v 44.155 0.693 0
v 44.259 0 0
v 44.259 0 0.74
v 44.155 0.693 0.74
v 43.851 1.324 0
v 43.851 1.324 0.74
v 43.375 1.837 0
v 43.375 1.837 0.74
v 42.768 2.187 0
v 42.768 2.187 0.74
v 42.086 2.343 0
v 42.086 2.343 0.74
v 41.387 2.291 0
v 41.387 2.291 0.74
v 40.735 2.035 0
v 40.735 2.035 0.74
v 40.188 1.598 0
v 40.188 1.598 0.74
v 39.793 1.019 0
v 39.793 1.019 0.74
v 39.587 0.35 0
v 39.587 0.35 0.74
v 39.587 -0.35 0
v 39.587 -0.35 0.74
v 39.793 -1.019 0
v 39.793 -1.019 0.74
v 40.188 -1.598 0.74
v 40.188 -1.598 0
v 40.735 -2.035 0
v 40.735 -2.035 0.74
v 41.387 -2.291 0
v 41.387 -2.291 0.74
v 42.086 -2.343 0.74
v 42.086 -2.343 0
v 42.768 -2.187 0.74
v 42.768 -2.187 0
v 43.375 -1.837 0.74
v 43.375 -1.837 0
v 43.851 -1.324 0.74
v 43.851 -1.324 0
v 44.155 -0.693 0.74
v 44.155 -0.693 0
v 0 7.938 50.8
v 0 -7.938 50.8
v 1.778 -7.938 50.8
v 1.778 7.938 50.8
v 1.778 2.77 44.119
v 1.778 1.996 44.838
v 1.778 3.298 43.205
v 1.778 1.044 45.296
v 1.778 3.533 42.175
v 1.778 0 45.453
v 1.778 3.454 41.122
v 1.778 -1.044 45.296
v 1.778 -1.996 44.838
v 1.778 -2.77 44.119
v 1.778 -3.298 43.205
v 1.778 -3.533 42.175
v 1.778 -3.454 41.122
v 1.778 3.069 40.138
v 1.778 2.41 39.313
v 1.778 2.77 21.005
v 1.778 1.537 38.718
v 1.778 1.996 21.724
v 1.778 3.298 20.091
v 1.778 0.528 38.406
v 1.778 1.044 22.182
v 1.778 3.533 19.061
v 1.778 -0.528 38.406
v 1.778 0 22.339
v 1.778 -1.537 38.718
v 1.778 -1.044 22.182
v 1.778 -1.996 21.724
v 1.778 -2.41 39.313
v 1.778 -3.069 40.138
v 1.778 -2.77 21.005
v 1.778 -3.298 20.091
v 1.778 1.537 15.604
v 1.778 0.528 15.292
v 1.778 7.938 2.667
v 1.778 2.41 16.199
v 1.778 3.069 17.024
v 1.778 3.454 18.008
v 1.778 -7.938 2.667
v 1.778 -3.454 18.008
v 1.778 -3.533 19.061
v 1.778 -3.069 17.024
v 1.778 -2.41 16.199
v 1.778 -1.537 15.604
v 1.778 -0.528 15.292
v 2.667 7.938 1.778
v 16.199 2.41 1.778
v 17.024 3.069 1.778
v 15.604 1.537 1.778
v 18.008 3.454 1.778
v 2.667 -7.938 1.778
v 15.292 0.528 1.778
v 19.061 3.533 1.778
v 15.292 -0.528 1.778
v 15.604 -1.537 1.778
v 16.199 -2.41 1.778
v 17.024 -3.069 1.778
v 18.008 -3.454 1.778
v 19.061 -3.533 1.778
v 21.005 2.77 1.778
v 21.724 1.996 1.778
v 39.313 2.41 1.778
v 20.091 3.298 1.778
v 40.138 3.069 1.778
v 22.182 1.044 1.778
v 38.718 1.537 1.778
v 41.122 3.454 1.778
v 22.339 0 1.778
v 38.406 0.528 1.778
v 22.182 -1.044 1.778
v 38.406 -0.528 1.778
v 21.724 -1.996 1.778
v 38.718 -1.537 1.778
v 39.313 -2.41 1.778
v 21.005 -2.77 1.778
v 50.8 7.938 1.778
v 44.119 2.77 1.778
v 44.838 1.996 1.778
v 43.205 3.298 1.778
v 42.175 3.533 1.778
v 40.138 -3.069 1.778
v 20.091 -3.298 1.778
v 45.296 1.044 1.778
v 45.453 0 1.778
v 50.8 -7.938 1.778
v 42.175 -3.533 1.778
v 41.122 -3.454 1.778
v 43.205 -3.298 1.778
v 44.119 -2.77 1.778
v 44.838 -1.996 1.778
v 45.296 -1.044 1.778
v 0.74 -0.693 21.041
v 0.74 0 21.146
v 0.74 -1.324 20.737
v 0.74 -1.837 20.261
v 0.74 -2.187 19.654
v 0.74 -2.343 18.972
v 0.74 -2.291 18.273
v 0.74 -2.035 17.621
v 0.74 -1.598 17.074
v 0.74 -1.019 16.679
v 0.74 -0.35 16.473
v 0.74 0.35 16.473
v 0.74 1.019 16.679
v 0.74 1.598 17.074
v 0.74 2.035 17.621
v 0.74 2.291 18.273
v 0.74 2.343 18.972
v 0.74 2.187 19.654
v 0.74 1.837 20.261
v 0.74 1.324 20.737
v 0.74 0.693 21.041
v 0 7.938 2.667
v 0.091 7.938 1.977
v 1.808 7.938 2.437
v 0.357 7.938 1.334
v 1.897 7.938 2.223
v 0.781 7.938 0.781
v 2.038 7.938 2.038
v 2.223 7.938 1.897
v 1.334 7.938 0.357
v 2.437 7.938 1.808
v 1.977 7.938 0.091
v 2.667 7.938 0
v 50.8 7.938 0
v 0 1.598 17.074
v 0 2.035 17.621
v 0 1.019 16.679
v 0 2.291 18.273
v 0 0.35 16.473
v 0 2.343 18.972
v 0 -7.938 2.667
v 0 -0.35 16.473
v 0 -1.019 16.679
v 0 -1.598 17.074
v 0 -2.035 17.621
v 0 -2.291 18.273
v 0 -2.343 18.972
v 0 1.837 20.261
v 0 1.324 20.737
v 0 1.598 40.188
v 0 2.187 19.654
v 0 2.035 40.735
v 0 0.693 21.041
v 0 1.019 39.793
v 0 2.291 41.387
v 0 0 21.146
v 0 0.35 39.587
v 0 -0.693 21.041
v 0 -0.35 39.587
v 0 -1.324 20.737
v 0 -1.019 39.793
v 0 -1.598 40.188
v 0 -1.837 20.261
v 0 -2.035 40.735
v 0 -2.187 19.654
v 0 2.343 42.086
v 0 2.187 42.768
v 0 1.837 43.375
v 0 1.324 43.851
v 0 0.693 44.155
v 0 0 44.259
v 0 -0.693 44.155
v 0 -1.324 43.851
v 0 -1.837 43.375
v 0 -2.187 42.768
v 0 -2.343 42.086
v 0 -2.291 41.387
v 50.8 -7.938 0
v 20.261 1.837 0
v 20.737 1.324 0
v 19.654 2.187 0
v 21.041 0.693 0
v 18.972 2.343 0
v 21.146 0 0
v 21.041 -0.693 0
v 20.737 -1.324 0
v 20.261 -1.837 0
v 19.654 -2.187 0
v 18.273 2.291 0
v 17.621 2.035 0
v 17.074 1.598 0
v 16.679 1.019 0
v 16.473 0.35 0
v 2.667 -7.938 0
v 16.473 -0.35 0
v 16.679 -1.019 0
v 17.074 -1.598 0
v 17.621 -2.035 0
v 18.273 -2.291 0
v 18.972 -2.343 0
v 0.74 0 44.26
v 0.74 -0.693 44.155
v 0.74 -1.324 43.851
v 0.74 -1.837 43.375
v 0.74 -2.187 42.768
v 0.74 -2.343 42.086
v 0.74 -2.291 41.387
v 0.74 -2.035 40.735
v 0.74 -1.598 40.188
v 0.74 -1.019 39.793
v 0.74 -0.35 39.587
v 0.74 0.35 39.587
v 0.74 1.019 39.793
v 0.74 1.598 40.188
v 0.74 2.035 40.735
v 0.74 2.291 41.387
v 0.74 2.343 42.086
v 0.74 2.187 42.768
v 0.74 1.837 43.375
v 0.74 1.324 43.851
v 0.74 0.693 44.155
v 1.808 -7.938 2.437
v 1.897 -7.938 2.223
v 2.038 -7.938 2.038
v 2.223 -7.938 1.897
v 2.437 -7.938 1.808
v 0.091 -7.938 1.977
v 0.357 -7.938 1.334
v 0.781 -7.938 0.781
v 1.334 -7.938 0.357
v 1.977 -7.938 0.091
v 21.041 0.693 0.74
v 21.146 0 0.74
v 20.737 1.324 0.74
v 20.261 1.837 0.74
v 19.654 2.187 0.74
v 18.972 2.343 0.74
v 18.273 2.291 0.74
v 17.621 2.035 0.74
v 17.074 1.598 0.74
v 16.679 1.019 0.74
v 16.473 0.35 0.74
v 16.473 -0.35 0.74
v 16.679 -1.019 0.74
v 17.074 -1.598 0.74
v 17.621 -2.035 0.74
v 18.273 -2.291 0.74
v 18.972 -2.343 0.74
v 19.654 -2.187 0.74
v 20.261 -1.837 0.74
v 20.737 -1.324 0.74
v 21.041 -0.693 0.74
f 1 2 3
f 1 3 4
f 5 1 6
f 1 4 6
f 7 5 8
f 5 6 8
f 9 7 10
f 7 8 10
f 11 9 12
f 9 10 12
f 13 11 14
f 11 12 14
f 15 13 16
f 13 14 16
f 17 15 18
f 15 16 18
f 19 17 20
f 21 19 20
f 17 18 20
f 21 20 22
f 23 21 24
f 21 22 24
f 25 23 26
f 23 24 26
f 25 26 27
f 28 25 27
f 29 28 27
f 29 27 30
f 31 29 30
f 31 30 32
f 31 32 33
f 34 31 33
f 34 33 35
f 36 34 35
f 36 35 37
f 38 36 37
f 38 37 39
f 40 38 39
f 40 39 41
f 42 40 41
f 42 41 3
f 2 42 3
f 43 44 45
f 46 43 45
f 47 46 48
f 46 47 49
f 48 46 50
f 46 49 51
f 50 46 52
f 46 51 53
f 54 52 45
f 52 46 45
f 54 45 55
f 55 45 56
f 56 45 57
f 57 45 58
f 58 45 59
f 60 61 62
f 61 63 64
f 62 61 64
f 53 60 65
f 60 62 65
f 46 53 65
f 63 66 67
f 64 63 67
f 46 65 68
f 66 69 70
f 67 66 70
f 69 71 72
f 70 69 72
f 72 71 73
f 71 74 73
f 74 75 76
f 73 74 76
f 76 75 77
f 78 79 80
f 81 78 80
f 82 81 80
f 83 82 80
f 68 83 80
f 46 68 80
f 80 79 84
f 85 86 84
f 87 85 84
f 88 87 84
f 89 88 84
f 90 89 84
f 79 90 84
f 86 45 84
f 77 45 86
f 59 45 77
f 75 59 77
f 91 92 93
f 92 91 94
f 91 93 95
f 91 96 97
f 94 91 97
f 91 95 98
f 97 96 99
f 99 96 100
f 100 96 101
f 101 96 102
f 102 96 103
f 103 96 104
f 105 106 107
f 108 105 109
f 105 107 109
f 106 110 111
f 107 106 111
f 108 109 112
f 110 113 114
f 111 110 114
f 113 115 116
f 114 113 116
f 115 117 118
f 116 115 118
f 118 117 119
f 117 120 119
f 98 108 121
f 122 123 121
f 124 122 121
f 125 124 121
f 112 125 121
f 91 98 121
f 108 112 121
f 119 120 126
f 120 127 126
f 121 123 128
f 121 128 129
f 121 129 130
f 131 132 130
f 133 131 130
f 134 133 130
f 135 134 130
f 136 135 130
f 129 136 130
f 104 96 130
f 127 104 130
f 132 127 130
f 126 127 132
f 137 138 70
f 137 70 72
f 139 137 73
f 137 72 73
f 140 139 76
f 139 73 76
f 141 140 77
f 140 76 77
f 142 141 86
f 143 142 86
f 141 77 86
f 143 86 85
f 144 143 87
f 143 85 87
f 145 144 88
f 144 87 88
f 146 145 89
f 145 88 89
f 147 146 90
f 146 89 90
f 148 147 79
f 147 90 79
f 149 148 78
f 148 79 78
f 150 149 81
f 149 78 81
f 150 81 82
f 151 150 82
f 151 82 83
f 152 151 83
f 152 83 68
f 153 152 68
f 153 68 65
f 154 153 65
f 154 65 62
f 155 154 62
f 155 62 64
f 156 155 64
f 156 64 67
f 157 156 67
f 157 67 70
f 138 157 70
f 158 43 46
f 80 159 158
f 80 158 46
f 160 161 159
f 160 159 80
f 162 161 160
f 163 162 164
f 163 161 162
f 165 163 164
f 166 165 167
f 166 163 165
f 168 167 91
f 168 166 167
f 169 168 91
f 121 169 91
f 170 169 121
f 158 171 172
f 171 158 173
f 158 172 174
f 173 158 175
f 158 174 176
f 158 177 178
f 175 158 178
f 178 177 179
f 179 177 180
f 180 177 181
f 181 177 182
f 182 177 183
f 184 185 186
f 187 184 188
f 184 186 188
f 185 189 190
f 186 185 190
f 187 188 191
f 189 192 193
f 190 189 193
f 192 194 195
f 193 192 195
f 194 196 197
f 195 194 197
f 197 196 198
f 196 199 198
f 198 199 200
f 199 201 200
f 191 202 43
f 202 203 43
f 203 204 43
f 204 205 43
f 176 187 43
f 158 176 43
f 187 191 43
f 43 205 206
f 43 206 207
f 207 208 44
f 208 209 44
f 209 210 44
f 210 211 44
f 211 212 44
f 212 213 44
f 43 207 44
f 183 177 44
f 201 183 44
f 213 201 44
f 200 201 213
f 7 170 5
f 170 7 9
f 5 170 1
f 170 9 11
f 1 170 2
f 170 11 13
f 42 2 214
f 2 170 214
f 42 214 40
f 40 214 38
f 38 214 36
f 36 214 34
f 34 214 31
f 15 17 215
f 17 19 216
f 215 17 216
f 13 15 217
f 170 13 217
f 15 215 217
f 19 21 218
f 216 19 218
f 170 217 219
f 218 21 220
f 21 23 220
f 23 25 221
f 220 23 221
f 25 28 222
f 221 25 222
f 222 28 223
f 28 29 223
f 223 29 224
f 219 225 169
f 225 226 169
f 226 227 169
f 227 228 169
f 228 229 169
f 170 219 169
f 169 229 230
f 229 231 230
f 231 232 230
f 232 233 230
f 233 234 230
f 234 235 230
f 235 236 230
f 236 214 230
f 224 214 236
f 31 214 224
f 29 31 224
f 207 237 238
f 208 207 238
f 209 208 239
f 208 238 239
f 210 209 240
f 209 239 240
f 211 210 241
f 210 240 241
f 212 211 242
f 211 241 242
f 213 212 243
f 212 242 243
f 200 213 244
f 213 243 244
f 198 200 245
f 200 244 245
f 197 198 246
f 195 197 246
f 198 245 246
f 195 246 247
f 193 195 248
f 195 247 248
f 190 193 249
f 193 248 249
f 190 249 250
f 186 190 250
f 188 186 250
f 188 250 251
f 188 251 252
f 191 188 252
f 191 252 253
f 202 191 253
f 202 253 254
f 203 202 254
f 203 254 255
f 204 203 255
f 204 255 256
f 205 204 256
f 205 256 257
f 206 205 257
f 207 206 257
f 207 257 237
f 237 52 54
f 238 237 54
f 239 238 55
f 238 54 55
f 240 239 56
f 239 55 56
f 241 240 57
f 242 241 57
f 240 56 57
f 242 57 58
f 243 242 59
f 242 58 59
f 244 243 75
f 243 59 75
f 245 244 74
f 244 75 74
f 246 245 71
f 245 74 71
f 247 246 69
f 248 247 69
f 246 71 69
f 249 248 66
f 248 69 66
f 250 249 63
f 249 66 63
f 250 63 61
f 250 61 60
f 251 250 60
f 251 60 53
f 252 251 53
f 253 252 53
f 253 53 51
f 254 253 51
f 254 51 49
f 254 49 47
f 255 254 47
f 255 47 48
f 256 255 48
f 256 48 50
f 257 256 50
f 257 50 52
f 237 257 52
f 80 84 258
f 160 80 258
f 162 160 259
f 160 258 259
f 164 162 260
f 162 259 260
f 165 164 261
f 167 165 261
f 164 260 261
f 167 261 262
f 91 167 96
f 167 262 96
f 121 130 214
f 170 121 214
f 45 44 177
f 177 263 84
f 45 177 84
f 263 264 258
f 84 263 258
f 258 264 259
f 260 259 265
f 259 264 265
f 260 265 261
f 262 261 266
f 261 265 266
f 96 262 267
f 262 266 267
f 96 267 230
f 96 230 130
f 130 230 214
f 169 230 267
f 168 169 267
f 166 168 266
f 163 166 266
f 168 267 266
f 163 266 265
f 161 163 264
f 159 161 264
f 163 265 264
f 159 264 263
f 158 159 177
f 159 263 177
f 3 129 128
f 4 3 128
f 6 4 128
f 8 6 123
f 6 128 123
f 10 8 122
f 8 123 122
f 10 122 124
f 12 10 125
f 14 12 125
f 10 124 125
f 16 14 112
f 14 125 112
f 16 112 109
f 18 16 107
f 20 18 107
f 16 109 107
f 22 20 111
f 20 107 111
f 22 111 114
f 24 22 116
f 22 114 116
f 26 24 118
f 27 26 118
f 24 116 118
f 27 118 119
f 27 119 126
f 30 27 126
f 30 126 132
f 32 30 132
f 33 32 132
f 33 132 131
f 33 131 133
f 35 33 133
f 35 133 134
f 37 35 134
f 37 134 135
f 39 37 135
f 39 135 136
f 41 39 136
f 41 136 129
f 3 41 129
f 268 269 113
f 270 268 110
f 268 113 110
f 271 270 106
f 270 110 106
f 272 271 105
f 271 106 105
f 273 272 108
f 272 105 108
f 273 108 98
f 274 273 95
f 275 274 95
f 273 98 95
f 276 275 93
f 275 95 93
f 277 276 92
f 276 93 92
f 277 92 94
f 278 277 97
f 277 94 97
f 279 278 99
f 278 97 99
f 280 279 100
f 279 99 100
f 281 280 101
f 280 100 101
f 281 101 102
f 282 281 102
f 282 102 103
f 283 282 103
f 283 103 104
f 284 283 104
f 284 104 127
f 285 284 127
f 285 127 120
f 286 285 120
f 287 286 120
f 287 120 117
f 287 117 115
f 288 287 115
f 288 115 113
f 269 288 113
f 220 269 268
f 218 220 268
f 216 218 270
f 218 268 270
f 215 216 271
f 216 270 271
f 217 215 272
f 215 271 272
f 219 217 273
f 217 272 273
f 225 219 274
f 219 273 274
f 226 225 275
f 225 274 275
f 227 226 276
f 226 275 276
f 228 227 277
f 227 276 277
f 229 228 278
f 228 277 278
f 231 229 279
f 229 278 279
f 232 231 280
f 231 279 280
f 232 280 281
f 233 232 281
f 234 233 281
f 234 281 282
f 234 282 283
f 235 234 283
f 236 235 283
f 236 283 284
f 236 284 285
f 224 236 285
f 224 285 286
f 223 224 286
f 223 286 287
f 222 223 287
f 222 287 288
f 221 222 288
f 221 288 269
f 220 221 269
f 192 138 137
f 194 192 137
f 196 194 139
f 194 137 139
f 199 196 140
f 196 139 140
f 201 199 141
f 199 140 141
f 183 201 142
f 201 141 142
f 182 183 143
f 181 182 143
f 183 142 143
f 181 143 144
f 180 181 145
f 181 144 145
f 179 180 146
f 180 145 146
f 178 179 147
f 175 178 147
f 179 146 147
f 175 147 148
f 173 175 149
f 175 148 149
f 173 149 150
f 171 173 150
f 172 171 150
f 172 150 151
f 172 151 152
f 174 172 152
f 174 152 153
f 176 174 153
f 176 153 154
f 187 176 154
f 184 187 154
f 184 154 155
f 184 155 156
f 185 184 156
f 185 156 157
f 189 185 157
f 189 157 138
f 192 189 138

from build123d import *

# Parameters (mm, degrees)
EXTRUDE_THIN1_START          = -7.9375
EXTRUDE_THIN1_DEPTH          = 15.875
SKETCH4_R                    = 2.3495
EXTRUDE3_DEPTH               = 69.543095394
SKETCH7_R                    = 3.5433
CUT_EXTRUDE1_DEPTH           = 72.040836075
CUT_EXTRUDE1_DRAFT           = -49
CUT_EXTRUDE1_PROFILE_2_DEPTH = 72.040836075
CUT_EXTRUDE1_PROFILE_2_DRAFT = -49
CIRPATTERN1_COUNT            = 2
CIRPATTERN1_COPY_1_SKETCH_R  = 3.5433
CIRPATTERN1_COPY_1_DEPTH     = 72.040836075
CIRPATTERN1_COPY_1_DRAFT     = -49
CIRPATTERN1_COPY_2_SKETCH_R  = 3.5433
CIRPATTERN1_COPY_2_DEPTH     = 72.040836075
CIRPATTERN1_COPY_2_DRAFT     = -49
CIRPATTERN1_COPY_3_SKETCH_R  = 3.5433
CIRPATTERN1_COPY_3_DEPTH     = 72.040836075
CIRPATTERN1_COPY_3_DRAFT     = -49


# Read off the part's stored shape, not the designer's step: Extrude-Thin1
with BuildPart() as part:
    # Extrude-Thin1 outline → Extrude-Thin1 (new body)
    with BuildSketch(Plane(origin=(0, 0, 0), x_dir=(1, 0, 0), z_dir=(0, 1, 0)).offset(EXTRUDE_THIN1_START)):
        with BuildLine():
            Line((2.667, -1.778), (50.8, -1.778))
            Line((50.8, -1.778), (50.8, 0))
            Line((50.8, 0), (2.667, 0))
            ThreePointArc((2.667, 0), (0.781146215, -0.781146215), (0, -2.667))
            Line((0, -2.667), (0, -50.8))
            Line((0, -50.8), (1.778, -50.8))
            Line((1.778, -50.8), (1.778, -2.667))
            ThreePointArc((1.778, -2.667), (2.038382072, -2.038382072), (2.667, -1.778))
        make_face()
    extrude(amount=EXTRUDE_THIN1_DEPTH)

    # Sketch4 → Extrude3 (cut, through all)
    with BuildSketch(Plane(origin=(3.556, 0, 1.778), x_dir=(1, 0, 0), z_dir=(0, 0, 1))):
        with Locations((38.354, 0)):
            Circle(SKETCH4_R)
        with Locations((15.24, 0)):
            Circle(SKETCH4_R)
    extrude3 = extrude(amount=-EXTRUDE3_DEPTH, mode=Mode.SUBTRACT)


with BuildPart() as cut_extrude1_tool:
    # Sketch7 → Cut-Extrude1 (with draft: the straight prism first)
    with BuildSketch(Plane.XY.offset(1.778)):
        with Locations((41.91, 0)):
            Circle(SKETCH7_R)
    extrude(amount=-CUT_EXTRUDE1_DEPTH)
    # Cut-Extrude1: the draft: its side faces are tilted about the plane it starts from
    cut_extrude1_sides = [cut_extrude1_tool.faces().sort_by_distance(p)[0] for p in [
        (38.3667, 0, -34.242418038),
    ]]
    draft(cut_extrude1_sides, Plane.XY.offset(1.778), CUT_EXTRUDE1_DRAFT)


with BuildPart() as part_1:
    add(part.part)

    # Cut-Extrude1: cut by cut_extrude1_tool
    add(cut_extrude1_tool.part, mode=Mode.SUBTRACT)


with BuildPart() as cut_extrude1_profile_2_tool:
    # Sketch7 → Cut-Extrude1 profile 2 (with draft: the straight prism first)
    with BuildSketch(Plane.XY.offset(1.778)):
        with Locations((18.796, 0)):
            Circle(SKETCH7_R)
    extrude(amount=-CUT_EXTRUDE1_PROFILE_2_DEPTH)
    # Cut-Extrude1 profile 2: the draft: its side faces are tilted about the plane it starts from
    cut_extrude1_profile_2_sides = [cut_extrude1_profile_2_tool.faces().sort_by_distance(p)[0] for p in [
        (15.2527, 0, -34.242418038),
    ]]
    draft(cut_extrude1_profile_2_sides, Plane.XY.offset(1.778), CUT_EXTRUDE1_PROFILE_2_DRAFT)


with BuildPart() as part_2:
    add(part_1.part)

    # Cut-Extrude1 profile 2: cut by cut_extrude1_profile_2_tool
    add(cut_extrude1_profile_2_tool.part, mode=Mode.SUBTRACT)

    # CirPattern1: Extrude3 ×2 about axis
    cirpattern1_axis = Axis((0, 0, 0), (0.7071067811865464, 0, 0.7071067811865487))
    for i in range(1, CIRPATTERN1_COUNT):
        add(extrude3.rotate(cirpattern1_axis, i * 360 / CIRPATTERN1_COUNT), mode=Mode.SUBTRACT)


with BuildPart() as cirpattern1_copy_1_tool:
    # CirPattern1 copy 1 sketch → CirPattern1 copy 1 (with draft: the straight prism first)
    with BuildSketch(Plane(origin=(1.778, 0, 0), x_dir=(0, 0, 1), z_dir=(1, 0, 0))):
        with Locations((41.91, 0)):
            Circle(CIRPATTERN1_COPY_1_SKETCH_R)
    extrude(amount=-CIRPATTERN1_COPY_1_DEPTH)
    # CirPattern1 copy 1: the draft: its side faces are tilted about the plane it starts from
    cirpattern1_copy_1_sides = [cirpattern1_copy_1_tool.faces().sort_by_distance(p)[0] for p in [
        (-34.242418038, 0, 38.3667),
    ]]
    draft(cirpattern1_copy_1_sides, Plane(origin=(1.778, 0, 0), x_dir=(0, 0, 1), z_dir=(1, 0, 0)), CIRPATTERN1_COPY_1_DRAFT)


with BuildPart() as part_3:
    add(part_2.part)

    # CirPattern1 copy 1: cut by cirpattern1_copy_1_tool
    add(cirpattern1_copy_1_tool.part, mode=Mode.SUBTRACT)


with BuildPart() as cirpattern1_copy_2_tool:
    # CirPattern1 copy 2 sketch → CirPattern1 copy 2 (with draft: the straight prism first)
    with BuildSketch(Plane(origin=(1.778, 0, 0), x_dir=(0, 0, 1), z_dir=(1, 0, 0))):
        with Locations((18.796, 0)):
            Circle(CIRPATTERN1_COPY_2_SKETCH_R)
    extrude(amount=-CIRPATTERN1_COPY_2_DEPTH)
    # CirPattern1 copy 2: the draft: its side faces are tilted about the plane it starts from
    cirpattern1_copy_2_sides = [cirpattern1_copy_2_tool.faces().sort_by_distance(p)[0] for p in [
        (-34.242418038, 0, 15.2527),
    ]]
    draft(cirpattern1_copy_2_sides, Plane(origin=(1.778, 0, 0), x_dir=(0, 0, 1), z_dir=(1, 0, 0)), CIRPATTERN1_COPY_2_DRAFT)


with BuildPart() as part_4:
    add(part_3.part)

    # CirPattern1 copy 2: cut by cirpattern1_copy_2_tool
    add(cirpattern1_copy_2_tool.part, mode=Mode.SUBTRACT)


with BuildPart() as cirpattern1_copy_3_tool:
    # CirPattern1 copy 3 sketch → CirPattern1 copy 3 (with draft: the straight prism first)
    with BuildSketch(Plane(origin=(1.778, 0, 0), x_dir=(0, 0, 1), z_dir=(1, 0, 0))):
        with Locations((18.796, 0)):
            Circle(CIRPATTERN1_COPY_3_SKETCH_R)
    extrude(amount=-CIRPATTERN1_COPY_3_DEPTH)
    # CirPattern1 copy 3: the draft: its side faces are tilted about the plane it starts from
    cirpattern1_copy_3_sides = [cirpattern1_copy_3_tool.faces().sort_by_distance(p)[0] for p in [
        (-34.242418038, 0, 15.2527),
    ]]
    draft(cirpattern1_copy_3_sides, Plane(origin=(1.778, 0, 0), x_dir=(0, 0, 1), z_dir=(1, 0, 0)), CIRPATTERN1_COPY_3_DRAFT)


with BuildPart() as part_5:
    add(part_4.part)

    # CirPattern1 copy 3: cut by cirpattern1_copy_3_tool
    add(cirpattern1_copy_3_tool.part, mode=Mode.SUBTRACT)


solid = part_5.part
